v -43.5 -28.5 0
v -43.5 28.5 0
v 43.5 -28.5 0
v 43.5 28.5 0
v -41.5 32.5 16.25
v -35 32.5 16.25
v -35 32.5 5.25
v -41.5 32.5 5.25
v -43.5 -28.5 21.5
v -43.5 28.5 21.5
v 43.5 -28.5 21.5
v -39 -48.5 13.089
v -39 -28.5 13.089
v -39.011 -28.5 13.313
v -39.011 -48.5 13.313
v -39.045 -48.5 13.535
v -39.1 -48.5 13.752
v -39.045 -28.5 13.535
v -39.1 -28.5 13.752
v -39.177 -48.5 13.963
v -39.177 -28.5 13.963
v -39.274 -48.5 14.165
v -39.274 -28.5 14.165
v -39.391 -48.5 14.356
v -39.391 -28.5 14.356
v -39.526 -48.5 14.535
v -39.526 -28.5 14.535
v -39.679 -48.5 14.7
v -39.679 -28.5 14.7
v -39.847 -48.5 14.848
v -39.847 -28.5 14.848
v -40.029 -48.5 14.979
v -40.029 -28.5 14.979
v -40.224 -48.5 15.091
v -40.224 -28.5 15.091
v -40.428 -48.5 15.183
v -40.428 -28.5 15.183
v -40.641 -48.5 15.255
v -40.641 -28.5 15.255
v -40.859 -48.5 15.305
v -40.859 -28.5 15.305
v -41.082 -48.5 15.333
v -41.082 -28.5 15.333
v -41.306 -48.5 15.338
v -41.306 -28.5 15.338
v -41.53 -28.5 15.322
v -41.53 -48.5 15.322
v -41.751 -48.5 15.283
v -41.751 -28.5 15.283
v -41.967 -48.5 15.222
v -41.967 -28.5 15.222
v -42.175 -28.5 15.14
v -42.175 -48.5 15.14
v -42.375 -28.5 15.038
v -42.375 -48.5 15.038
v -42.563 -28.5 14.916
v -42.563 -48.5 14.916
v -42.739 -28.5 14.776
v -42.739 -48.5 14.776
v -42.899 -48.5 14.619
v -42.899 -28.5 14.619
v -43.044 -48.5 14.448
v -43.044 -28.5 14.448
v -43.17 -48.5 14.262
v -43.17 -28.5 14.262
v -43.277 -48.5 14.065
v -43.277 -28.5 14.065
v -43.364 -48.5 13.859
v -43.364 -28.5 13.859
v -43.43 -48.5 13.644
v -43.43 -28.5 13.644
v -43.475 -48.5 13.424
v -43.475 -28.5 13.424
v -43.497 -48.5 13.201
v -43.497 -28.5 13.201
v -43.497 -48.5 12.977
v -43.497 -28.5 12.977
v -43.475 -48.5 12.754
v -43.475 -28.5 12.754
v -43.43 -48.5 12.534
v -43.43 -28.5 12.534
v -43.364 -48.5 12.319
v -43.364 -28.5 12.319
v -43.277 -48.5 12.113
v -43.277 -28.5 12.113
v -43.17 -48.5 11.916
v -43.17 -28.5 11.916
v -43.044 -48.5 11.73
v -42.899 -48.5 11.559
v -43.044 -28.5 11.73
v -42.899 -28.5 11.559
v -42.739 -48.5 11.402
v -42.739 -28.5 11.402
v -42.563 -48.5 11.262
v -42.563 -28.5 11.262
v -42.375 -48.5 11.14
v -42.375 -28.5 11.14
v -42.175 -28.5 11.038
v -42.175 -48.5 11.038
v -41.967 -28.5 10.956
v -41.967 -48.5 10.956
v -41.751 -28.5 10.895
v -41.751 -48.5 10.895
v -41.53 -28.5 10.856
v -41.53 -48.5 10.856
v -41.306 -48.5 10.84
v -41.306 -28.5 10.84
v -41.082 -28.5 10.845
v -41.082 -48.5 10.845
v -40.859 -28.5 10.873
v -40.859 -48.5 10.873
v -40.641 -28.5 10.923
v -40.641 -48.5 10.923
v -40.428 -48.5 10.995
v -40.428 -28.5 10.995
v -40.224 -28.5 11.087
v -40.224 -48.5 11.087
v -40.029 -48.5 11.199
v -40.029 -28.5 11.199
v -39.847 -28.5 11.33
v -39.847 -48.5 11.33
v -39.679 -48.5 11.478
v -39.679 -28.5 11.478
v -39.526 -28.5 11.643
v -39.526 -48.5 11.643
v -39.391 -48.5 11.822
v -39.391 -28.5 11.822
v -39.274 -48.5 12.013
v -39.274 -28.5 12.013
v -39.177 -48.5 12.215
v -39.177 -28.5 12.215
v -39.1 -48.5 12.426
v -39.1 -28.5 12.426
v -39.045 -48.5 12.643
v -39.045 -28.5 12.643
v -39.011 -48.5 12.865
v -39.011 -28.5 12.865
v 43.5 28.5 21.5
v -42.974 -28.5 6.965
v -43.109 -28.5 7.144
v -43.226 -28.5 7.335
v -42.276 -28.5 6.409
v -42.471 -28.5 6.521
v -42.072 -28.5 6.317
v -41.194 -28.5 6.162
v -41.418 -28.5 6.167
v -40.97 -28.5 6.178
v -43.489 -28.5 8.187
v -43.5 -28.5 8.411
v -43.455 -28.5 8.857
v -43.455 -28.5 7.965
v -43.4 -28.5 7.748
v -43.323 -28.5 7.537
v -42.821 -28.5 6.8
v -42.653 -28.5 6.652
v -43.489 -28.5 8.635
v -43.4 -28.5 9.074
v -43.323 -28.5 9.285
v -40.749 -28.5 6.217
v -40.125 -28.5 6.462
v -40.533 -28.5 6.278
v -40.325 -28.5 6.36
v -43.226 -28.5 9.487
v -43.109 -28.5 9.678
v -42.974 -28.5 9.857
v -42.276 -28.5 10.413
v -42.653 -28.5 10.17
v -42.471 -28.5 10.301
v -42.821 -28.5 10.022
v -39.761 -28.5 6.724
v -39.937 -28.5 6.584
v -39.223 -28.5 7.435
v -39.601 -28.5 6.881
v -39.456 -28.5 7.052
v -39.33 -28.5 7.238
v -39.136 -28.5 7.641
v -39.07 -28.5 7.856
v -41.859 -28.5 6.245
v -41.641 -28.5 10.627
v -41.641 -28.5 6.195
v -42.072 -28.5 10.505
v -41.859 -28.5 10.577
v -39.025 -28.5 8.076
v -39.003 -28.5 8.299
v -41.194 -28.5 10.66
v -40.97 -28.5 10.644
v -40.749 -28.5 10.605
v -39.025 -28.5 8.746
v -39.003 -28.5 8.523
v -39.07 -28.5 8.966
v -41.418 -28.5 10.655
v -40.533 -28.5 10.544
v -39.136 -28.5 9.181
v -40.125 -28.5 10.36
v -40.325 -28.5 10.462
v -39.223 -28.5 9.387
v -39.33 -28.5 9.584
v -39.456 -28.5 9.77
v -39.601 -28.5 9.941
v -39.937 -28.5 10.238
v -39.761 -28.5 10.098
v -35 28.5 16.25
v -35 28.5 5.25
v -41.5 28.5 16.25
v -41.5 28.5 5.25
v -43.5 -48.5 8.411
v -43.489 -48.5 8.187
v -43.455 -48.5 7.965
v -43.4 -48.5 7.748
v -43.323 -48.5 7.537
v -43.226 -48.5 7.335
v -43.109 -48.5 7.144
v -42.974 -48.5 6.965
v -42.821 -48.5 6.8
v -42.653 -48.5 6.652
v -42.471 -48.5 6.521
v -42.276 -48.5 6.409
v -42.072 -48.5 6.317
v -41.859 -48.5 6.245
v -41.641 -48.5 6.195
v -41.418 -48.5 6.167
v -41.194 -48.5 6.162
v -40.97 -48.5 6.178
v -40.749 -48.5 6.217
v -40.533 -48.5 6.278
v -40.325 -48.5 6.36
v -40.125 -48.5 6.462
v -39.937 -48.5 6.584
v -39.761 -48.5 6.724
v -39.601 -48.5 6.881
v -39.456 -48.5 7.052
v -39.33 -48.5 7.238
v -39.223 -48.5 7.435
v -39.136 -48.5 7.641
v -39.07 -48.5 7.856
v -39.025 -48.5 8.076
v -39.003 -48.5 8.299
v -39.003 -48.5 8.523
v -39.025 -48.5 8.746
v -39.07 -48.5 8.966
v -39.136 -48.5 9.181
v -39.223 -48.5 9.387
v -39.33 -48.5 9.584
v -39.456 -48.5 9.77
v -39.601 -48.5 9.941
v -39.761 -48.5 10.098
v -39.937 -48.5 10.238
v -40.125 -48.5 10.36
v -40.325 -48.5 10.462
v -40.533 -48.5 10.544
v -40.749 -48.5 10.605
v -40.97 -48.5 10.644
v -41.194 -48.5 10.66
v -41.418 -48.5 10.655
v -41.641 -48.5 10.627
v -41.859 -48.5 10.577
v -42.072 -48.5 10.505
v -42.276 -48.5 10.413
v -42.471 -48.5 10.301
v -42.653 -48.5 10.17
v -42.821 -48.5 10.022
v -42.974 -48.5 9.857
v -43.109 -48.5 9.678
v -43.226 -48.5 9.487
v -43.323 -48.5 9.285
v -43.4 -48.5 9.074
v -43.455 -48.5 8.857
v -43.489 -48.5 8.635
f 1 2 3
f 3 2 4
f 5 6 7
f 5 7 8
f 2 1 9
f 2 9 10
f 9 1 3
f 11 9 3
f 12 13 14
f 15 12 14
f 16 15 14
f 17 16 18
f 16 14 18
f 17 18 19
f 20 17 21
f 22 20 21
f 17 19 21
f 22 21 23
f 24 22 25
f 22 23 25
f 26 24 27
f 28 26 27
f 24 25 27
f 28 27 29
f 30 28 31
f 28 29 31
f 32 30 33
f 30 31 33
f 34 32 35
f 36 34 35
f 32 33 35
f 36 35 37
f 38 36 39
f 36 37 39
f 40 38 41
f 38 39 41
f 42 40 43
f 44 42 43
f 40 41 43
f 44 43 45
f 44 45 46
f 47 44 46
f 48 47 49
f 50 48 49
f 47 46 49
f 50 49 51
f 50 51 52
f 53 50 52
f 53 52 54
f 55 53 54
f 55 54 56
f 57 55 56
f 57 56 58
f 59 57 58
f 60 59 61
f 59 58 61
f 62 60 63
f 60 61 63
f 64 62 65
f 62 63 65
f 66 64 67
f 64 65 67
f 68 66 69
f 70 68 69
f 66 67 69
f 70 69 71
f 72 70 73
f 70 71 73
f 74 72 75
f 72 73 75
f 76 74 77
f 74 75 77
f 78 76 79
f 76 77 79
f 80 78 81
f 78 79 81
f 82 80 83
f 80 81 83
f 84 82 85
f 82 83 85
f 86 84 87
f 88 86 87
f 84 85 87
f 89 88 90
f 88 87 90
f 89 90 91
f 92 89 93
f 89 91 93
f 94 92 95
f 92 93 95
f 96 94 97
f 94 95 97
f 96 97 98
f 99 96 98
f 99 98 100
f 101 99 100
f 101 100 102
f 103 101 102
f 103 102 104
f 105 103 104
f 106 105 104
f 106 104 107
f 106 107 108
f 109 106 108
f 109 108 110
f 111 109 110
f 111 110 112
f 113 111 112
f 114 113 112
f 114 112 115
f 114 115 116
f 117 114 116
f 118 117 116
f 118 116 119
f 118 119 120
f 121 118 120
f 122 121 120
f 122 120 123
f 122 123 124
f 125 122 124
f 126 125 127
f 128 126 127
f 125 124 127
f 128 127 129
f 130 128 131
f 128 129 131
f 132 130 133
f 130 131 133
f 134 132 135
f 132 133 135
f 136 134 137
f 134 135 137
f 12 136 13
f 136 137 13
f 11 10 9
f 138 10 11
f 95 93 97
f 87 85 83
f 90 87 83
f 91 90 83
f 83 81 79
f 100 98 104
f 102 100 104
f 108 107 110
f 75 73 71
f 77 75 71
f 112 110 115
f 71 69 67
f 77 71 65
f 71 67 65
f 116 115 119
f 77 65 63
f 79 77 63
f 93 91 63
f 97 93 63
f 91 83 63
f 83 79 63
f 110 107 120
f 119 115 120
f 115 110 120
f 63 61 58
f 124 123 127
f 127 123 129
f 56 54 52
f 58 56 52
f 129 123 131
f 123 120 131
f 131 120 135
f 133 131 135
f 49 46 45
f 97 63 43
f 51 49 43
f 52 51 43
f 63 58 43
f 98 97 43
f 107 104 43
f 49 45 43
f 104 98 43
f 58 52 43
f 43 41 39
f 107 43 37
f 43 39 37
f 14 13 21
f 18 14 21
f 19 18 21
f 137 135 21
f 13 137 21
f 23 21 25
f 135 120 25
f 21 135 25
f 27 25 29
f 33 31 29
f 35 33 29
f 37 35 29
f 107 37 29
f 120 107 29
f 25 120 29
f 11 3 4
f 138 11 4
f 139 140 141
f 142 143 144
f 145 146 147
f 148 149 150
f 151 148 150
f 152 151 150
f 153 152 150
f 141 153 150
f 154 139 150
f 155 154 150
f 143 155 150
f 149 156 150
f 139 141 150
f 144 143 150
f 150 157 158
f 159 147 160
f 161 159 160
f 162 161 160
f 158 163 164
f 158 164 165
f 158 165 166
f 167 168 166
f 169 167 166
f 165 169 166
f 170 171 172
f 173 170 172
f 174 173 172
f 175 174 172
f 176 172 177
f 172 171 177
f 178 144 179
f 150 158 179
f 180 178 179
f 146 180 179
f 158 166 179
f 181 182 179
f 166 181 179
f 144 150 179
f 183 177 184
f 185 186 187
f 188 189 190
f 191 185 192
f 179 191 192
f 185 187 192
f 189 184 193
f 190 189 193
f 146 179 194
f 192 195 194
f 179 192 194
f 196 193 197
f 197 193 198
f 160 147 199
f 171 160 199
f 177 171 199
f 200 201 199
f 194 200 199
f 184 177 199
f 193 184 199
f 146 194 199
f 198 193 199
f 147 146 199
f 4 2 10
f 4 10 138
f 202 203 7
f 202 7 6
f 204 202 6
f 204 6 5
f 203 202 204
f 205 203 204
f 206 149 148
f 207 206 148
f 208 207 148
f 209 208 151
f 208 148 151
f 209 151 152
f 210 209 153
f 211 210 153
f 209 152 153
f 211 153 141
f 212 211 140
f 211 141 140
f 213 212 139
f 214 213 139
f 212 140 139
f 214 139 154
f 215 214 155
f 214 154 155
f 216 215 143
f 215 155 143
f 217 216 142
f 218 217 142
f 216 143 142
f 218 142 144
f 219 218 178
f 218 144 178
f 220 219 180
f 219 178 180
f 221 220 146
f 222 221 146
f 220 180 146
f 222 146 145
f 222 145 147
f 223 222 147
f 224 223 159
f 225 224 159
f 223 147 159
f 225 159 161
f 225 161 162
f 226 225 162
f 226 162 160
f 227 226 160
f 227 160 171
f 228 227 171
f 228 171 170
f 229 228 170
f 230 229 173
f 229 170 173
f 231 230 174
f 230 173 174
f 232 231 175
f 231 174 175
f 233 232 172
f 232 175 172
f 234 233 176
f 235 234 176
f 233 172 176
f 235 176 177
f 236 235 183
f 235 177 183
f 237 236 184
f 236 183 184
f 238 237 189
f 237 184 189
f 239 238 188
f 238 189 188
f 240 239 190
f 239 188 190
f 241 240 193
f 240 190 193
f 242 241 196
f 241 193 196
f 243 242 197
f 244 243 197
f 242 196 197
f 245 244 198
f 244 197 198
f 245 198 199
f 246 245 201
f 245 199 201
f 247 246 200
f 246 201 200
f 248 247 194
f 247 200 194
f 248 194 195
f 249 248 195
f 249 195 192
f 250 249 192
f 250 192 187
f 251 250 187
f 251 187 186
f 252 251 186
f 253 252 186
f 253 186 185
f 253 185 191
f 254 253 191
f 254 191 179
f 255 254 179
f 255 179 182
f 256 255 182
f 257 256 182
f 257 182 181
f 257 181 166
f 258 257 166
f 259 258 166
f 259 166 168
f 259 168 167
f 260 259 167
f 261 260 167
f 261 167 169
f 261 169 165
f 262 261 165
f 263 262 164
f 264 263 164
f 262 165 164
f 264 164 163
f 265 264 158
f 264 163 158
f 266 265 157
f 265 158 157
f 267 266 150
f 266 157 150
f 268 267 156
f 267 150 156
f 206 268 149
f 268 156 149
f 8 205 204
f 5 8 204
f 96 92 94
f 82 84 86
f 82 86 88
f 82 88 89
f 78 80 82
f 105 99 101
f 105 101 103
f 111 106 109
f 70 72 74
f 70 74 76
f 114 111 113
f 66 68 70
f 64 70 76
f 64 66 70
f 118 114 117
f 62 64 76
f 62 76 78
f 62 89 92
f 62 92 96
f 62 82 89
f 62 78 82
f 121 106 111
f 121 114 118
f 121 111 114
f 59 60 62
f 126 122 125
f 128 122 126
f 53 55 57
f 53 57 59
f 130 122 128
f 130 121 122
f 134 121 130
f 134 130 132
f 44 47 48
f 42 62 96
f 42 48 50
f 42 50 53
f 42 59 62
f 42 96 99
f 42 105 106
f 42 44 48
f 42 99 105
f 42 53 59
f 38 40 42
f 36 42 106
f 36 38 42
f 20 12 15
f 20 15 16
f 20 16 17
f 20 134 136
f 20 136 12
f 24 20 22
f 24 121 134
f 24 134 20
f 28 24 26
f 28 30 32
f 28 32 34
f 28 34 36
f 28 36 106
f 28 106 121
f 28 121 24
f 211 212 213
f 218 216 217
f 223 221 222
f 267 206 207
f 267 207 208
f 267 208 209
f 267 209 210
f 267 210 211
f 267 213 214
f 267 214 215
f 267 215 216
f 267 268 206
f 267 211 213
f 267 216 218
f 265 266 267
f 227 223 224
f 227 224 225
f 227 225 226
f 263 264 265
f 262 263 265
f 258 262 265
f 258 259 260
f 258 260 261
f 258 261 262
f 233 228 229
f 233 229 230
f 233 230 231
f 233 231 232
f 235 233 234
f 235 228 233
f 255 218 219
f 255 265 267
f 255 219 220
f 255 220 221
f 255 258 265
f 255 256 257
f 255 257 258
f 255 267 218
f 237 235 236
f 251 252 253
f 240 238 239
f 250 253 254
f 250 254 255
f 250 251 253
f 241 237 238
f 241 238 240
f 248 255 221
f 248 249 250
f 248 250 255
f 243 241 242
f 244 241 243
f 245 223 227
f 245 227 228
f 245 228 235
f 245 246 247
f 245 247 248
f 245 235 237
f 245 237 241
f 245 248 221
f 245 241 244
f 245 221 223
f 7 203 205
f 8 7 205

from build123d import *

# Parameters (mm, degrees)
F0_W     = 87
F0_H     = 57
F1_DEPTH = 21.5
F3_DEPTH = 20
F4_W     = 6.5
F4_H     = 11
F5_DEPTH = 4


with BuildPart() as f1:
    # F0 (on Top) → F1 (new body)
    with BuildSketch(Plane.XY):
        Rectangle(F0_W, F0_H)
    extrude(amount=F1_DEPTH)


with BuildPart() as f3:
    # F2 (on face) → F3 (new body)
    with BuildSketch(Plane.XZ.offset(28.5)):
        with BuildLine():
            ThreePointArc((-43.5, 13.088999), (-41.25, 10.838999), (-39, 13.088999))
            ThreePointArc((-39, 13.088999), (-41.25, 15.338999), (-43.5, 13.088999))
        make_face()
        with BuildLine():
            ThreePointArc((-39, 8.411001), (-41.25, 10.661001), (-43.5, 8.411001))
            ThreePointArc((-43.5, 8.411001), (-41.25, 6.161001), (-39, 8.411001))
        make_face()
    extrude(amount=F3_DEPTH)


with BuildPart() as f5:
    # F4 (on face) → F5 (new body)
    with BuildSketch(Plane(origin=(0, 28.5, 0), x_dir=(-1, 0, 0), z_dir=(0, 1, 0))):
        with Locations((38.25, 10.75)):
            Rectangle(F4_W, F4_H)
    extrude(amount=F5_DEPTH)


solid = Compound([f1.part, f3.part, f5.part])
